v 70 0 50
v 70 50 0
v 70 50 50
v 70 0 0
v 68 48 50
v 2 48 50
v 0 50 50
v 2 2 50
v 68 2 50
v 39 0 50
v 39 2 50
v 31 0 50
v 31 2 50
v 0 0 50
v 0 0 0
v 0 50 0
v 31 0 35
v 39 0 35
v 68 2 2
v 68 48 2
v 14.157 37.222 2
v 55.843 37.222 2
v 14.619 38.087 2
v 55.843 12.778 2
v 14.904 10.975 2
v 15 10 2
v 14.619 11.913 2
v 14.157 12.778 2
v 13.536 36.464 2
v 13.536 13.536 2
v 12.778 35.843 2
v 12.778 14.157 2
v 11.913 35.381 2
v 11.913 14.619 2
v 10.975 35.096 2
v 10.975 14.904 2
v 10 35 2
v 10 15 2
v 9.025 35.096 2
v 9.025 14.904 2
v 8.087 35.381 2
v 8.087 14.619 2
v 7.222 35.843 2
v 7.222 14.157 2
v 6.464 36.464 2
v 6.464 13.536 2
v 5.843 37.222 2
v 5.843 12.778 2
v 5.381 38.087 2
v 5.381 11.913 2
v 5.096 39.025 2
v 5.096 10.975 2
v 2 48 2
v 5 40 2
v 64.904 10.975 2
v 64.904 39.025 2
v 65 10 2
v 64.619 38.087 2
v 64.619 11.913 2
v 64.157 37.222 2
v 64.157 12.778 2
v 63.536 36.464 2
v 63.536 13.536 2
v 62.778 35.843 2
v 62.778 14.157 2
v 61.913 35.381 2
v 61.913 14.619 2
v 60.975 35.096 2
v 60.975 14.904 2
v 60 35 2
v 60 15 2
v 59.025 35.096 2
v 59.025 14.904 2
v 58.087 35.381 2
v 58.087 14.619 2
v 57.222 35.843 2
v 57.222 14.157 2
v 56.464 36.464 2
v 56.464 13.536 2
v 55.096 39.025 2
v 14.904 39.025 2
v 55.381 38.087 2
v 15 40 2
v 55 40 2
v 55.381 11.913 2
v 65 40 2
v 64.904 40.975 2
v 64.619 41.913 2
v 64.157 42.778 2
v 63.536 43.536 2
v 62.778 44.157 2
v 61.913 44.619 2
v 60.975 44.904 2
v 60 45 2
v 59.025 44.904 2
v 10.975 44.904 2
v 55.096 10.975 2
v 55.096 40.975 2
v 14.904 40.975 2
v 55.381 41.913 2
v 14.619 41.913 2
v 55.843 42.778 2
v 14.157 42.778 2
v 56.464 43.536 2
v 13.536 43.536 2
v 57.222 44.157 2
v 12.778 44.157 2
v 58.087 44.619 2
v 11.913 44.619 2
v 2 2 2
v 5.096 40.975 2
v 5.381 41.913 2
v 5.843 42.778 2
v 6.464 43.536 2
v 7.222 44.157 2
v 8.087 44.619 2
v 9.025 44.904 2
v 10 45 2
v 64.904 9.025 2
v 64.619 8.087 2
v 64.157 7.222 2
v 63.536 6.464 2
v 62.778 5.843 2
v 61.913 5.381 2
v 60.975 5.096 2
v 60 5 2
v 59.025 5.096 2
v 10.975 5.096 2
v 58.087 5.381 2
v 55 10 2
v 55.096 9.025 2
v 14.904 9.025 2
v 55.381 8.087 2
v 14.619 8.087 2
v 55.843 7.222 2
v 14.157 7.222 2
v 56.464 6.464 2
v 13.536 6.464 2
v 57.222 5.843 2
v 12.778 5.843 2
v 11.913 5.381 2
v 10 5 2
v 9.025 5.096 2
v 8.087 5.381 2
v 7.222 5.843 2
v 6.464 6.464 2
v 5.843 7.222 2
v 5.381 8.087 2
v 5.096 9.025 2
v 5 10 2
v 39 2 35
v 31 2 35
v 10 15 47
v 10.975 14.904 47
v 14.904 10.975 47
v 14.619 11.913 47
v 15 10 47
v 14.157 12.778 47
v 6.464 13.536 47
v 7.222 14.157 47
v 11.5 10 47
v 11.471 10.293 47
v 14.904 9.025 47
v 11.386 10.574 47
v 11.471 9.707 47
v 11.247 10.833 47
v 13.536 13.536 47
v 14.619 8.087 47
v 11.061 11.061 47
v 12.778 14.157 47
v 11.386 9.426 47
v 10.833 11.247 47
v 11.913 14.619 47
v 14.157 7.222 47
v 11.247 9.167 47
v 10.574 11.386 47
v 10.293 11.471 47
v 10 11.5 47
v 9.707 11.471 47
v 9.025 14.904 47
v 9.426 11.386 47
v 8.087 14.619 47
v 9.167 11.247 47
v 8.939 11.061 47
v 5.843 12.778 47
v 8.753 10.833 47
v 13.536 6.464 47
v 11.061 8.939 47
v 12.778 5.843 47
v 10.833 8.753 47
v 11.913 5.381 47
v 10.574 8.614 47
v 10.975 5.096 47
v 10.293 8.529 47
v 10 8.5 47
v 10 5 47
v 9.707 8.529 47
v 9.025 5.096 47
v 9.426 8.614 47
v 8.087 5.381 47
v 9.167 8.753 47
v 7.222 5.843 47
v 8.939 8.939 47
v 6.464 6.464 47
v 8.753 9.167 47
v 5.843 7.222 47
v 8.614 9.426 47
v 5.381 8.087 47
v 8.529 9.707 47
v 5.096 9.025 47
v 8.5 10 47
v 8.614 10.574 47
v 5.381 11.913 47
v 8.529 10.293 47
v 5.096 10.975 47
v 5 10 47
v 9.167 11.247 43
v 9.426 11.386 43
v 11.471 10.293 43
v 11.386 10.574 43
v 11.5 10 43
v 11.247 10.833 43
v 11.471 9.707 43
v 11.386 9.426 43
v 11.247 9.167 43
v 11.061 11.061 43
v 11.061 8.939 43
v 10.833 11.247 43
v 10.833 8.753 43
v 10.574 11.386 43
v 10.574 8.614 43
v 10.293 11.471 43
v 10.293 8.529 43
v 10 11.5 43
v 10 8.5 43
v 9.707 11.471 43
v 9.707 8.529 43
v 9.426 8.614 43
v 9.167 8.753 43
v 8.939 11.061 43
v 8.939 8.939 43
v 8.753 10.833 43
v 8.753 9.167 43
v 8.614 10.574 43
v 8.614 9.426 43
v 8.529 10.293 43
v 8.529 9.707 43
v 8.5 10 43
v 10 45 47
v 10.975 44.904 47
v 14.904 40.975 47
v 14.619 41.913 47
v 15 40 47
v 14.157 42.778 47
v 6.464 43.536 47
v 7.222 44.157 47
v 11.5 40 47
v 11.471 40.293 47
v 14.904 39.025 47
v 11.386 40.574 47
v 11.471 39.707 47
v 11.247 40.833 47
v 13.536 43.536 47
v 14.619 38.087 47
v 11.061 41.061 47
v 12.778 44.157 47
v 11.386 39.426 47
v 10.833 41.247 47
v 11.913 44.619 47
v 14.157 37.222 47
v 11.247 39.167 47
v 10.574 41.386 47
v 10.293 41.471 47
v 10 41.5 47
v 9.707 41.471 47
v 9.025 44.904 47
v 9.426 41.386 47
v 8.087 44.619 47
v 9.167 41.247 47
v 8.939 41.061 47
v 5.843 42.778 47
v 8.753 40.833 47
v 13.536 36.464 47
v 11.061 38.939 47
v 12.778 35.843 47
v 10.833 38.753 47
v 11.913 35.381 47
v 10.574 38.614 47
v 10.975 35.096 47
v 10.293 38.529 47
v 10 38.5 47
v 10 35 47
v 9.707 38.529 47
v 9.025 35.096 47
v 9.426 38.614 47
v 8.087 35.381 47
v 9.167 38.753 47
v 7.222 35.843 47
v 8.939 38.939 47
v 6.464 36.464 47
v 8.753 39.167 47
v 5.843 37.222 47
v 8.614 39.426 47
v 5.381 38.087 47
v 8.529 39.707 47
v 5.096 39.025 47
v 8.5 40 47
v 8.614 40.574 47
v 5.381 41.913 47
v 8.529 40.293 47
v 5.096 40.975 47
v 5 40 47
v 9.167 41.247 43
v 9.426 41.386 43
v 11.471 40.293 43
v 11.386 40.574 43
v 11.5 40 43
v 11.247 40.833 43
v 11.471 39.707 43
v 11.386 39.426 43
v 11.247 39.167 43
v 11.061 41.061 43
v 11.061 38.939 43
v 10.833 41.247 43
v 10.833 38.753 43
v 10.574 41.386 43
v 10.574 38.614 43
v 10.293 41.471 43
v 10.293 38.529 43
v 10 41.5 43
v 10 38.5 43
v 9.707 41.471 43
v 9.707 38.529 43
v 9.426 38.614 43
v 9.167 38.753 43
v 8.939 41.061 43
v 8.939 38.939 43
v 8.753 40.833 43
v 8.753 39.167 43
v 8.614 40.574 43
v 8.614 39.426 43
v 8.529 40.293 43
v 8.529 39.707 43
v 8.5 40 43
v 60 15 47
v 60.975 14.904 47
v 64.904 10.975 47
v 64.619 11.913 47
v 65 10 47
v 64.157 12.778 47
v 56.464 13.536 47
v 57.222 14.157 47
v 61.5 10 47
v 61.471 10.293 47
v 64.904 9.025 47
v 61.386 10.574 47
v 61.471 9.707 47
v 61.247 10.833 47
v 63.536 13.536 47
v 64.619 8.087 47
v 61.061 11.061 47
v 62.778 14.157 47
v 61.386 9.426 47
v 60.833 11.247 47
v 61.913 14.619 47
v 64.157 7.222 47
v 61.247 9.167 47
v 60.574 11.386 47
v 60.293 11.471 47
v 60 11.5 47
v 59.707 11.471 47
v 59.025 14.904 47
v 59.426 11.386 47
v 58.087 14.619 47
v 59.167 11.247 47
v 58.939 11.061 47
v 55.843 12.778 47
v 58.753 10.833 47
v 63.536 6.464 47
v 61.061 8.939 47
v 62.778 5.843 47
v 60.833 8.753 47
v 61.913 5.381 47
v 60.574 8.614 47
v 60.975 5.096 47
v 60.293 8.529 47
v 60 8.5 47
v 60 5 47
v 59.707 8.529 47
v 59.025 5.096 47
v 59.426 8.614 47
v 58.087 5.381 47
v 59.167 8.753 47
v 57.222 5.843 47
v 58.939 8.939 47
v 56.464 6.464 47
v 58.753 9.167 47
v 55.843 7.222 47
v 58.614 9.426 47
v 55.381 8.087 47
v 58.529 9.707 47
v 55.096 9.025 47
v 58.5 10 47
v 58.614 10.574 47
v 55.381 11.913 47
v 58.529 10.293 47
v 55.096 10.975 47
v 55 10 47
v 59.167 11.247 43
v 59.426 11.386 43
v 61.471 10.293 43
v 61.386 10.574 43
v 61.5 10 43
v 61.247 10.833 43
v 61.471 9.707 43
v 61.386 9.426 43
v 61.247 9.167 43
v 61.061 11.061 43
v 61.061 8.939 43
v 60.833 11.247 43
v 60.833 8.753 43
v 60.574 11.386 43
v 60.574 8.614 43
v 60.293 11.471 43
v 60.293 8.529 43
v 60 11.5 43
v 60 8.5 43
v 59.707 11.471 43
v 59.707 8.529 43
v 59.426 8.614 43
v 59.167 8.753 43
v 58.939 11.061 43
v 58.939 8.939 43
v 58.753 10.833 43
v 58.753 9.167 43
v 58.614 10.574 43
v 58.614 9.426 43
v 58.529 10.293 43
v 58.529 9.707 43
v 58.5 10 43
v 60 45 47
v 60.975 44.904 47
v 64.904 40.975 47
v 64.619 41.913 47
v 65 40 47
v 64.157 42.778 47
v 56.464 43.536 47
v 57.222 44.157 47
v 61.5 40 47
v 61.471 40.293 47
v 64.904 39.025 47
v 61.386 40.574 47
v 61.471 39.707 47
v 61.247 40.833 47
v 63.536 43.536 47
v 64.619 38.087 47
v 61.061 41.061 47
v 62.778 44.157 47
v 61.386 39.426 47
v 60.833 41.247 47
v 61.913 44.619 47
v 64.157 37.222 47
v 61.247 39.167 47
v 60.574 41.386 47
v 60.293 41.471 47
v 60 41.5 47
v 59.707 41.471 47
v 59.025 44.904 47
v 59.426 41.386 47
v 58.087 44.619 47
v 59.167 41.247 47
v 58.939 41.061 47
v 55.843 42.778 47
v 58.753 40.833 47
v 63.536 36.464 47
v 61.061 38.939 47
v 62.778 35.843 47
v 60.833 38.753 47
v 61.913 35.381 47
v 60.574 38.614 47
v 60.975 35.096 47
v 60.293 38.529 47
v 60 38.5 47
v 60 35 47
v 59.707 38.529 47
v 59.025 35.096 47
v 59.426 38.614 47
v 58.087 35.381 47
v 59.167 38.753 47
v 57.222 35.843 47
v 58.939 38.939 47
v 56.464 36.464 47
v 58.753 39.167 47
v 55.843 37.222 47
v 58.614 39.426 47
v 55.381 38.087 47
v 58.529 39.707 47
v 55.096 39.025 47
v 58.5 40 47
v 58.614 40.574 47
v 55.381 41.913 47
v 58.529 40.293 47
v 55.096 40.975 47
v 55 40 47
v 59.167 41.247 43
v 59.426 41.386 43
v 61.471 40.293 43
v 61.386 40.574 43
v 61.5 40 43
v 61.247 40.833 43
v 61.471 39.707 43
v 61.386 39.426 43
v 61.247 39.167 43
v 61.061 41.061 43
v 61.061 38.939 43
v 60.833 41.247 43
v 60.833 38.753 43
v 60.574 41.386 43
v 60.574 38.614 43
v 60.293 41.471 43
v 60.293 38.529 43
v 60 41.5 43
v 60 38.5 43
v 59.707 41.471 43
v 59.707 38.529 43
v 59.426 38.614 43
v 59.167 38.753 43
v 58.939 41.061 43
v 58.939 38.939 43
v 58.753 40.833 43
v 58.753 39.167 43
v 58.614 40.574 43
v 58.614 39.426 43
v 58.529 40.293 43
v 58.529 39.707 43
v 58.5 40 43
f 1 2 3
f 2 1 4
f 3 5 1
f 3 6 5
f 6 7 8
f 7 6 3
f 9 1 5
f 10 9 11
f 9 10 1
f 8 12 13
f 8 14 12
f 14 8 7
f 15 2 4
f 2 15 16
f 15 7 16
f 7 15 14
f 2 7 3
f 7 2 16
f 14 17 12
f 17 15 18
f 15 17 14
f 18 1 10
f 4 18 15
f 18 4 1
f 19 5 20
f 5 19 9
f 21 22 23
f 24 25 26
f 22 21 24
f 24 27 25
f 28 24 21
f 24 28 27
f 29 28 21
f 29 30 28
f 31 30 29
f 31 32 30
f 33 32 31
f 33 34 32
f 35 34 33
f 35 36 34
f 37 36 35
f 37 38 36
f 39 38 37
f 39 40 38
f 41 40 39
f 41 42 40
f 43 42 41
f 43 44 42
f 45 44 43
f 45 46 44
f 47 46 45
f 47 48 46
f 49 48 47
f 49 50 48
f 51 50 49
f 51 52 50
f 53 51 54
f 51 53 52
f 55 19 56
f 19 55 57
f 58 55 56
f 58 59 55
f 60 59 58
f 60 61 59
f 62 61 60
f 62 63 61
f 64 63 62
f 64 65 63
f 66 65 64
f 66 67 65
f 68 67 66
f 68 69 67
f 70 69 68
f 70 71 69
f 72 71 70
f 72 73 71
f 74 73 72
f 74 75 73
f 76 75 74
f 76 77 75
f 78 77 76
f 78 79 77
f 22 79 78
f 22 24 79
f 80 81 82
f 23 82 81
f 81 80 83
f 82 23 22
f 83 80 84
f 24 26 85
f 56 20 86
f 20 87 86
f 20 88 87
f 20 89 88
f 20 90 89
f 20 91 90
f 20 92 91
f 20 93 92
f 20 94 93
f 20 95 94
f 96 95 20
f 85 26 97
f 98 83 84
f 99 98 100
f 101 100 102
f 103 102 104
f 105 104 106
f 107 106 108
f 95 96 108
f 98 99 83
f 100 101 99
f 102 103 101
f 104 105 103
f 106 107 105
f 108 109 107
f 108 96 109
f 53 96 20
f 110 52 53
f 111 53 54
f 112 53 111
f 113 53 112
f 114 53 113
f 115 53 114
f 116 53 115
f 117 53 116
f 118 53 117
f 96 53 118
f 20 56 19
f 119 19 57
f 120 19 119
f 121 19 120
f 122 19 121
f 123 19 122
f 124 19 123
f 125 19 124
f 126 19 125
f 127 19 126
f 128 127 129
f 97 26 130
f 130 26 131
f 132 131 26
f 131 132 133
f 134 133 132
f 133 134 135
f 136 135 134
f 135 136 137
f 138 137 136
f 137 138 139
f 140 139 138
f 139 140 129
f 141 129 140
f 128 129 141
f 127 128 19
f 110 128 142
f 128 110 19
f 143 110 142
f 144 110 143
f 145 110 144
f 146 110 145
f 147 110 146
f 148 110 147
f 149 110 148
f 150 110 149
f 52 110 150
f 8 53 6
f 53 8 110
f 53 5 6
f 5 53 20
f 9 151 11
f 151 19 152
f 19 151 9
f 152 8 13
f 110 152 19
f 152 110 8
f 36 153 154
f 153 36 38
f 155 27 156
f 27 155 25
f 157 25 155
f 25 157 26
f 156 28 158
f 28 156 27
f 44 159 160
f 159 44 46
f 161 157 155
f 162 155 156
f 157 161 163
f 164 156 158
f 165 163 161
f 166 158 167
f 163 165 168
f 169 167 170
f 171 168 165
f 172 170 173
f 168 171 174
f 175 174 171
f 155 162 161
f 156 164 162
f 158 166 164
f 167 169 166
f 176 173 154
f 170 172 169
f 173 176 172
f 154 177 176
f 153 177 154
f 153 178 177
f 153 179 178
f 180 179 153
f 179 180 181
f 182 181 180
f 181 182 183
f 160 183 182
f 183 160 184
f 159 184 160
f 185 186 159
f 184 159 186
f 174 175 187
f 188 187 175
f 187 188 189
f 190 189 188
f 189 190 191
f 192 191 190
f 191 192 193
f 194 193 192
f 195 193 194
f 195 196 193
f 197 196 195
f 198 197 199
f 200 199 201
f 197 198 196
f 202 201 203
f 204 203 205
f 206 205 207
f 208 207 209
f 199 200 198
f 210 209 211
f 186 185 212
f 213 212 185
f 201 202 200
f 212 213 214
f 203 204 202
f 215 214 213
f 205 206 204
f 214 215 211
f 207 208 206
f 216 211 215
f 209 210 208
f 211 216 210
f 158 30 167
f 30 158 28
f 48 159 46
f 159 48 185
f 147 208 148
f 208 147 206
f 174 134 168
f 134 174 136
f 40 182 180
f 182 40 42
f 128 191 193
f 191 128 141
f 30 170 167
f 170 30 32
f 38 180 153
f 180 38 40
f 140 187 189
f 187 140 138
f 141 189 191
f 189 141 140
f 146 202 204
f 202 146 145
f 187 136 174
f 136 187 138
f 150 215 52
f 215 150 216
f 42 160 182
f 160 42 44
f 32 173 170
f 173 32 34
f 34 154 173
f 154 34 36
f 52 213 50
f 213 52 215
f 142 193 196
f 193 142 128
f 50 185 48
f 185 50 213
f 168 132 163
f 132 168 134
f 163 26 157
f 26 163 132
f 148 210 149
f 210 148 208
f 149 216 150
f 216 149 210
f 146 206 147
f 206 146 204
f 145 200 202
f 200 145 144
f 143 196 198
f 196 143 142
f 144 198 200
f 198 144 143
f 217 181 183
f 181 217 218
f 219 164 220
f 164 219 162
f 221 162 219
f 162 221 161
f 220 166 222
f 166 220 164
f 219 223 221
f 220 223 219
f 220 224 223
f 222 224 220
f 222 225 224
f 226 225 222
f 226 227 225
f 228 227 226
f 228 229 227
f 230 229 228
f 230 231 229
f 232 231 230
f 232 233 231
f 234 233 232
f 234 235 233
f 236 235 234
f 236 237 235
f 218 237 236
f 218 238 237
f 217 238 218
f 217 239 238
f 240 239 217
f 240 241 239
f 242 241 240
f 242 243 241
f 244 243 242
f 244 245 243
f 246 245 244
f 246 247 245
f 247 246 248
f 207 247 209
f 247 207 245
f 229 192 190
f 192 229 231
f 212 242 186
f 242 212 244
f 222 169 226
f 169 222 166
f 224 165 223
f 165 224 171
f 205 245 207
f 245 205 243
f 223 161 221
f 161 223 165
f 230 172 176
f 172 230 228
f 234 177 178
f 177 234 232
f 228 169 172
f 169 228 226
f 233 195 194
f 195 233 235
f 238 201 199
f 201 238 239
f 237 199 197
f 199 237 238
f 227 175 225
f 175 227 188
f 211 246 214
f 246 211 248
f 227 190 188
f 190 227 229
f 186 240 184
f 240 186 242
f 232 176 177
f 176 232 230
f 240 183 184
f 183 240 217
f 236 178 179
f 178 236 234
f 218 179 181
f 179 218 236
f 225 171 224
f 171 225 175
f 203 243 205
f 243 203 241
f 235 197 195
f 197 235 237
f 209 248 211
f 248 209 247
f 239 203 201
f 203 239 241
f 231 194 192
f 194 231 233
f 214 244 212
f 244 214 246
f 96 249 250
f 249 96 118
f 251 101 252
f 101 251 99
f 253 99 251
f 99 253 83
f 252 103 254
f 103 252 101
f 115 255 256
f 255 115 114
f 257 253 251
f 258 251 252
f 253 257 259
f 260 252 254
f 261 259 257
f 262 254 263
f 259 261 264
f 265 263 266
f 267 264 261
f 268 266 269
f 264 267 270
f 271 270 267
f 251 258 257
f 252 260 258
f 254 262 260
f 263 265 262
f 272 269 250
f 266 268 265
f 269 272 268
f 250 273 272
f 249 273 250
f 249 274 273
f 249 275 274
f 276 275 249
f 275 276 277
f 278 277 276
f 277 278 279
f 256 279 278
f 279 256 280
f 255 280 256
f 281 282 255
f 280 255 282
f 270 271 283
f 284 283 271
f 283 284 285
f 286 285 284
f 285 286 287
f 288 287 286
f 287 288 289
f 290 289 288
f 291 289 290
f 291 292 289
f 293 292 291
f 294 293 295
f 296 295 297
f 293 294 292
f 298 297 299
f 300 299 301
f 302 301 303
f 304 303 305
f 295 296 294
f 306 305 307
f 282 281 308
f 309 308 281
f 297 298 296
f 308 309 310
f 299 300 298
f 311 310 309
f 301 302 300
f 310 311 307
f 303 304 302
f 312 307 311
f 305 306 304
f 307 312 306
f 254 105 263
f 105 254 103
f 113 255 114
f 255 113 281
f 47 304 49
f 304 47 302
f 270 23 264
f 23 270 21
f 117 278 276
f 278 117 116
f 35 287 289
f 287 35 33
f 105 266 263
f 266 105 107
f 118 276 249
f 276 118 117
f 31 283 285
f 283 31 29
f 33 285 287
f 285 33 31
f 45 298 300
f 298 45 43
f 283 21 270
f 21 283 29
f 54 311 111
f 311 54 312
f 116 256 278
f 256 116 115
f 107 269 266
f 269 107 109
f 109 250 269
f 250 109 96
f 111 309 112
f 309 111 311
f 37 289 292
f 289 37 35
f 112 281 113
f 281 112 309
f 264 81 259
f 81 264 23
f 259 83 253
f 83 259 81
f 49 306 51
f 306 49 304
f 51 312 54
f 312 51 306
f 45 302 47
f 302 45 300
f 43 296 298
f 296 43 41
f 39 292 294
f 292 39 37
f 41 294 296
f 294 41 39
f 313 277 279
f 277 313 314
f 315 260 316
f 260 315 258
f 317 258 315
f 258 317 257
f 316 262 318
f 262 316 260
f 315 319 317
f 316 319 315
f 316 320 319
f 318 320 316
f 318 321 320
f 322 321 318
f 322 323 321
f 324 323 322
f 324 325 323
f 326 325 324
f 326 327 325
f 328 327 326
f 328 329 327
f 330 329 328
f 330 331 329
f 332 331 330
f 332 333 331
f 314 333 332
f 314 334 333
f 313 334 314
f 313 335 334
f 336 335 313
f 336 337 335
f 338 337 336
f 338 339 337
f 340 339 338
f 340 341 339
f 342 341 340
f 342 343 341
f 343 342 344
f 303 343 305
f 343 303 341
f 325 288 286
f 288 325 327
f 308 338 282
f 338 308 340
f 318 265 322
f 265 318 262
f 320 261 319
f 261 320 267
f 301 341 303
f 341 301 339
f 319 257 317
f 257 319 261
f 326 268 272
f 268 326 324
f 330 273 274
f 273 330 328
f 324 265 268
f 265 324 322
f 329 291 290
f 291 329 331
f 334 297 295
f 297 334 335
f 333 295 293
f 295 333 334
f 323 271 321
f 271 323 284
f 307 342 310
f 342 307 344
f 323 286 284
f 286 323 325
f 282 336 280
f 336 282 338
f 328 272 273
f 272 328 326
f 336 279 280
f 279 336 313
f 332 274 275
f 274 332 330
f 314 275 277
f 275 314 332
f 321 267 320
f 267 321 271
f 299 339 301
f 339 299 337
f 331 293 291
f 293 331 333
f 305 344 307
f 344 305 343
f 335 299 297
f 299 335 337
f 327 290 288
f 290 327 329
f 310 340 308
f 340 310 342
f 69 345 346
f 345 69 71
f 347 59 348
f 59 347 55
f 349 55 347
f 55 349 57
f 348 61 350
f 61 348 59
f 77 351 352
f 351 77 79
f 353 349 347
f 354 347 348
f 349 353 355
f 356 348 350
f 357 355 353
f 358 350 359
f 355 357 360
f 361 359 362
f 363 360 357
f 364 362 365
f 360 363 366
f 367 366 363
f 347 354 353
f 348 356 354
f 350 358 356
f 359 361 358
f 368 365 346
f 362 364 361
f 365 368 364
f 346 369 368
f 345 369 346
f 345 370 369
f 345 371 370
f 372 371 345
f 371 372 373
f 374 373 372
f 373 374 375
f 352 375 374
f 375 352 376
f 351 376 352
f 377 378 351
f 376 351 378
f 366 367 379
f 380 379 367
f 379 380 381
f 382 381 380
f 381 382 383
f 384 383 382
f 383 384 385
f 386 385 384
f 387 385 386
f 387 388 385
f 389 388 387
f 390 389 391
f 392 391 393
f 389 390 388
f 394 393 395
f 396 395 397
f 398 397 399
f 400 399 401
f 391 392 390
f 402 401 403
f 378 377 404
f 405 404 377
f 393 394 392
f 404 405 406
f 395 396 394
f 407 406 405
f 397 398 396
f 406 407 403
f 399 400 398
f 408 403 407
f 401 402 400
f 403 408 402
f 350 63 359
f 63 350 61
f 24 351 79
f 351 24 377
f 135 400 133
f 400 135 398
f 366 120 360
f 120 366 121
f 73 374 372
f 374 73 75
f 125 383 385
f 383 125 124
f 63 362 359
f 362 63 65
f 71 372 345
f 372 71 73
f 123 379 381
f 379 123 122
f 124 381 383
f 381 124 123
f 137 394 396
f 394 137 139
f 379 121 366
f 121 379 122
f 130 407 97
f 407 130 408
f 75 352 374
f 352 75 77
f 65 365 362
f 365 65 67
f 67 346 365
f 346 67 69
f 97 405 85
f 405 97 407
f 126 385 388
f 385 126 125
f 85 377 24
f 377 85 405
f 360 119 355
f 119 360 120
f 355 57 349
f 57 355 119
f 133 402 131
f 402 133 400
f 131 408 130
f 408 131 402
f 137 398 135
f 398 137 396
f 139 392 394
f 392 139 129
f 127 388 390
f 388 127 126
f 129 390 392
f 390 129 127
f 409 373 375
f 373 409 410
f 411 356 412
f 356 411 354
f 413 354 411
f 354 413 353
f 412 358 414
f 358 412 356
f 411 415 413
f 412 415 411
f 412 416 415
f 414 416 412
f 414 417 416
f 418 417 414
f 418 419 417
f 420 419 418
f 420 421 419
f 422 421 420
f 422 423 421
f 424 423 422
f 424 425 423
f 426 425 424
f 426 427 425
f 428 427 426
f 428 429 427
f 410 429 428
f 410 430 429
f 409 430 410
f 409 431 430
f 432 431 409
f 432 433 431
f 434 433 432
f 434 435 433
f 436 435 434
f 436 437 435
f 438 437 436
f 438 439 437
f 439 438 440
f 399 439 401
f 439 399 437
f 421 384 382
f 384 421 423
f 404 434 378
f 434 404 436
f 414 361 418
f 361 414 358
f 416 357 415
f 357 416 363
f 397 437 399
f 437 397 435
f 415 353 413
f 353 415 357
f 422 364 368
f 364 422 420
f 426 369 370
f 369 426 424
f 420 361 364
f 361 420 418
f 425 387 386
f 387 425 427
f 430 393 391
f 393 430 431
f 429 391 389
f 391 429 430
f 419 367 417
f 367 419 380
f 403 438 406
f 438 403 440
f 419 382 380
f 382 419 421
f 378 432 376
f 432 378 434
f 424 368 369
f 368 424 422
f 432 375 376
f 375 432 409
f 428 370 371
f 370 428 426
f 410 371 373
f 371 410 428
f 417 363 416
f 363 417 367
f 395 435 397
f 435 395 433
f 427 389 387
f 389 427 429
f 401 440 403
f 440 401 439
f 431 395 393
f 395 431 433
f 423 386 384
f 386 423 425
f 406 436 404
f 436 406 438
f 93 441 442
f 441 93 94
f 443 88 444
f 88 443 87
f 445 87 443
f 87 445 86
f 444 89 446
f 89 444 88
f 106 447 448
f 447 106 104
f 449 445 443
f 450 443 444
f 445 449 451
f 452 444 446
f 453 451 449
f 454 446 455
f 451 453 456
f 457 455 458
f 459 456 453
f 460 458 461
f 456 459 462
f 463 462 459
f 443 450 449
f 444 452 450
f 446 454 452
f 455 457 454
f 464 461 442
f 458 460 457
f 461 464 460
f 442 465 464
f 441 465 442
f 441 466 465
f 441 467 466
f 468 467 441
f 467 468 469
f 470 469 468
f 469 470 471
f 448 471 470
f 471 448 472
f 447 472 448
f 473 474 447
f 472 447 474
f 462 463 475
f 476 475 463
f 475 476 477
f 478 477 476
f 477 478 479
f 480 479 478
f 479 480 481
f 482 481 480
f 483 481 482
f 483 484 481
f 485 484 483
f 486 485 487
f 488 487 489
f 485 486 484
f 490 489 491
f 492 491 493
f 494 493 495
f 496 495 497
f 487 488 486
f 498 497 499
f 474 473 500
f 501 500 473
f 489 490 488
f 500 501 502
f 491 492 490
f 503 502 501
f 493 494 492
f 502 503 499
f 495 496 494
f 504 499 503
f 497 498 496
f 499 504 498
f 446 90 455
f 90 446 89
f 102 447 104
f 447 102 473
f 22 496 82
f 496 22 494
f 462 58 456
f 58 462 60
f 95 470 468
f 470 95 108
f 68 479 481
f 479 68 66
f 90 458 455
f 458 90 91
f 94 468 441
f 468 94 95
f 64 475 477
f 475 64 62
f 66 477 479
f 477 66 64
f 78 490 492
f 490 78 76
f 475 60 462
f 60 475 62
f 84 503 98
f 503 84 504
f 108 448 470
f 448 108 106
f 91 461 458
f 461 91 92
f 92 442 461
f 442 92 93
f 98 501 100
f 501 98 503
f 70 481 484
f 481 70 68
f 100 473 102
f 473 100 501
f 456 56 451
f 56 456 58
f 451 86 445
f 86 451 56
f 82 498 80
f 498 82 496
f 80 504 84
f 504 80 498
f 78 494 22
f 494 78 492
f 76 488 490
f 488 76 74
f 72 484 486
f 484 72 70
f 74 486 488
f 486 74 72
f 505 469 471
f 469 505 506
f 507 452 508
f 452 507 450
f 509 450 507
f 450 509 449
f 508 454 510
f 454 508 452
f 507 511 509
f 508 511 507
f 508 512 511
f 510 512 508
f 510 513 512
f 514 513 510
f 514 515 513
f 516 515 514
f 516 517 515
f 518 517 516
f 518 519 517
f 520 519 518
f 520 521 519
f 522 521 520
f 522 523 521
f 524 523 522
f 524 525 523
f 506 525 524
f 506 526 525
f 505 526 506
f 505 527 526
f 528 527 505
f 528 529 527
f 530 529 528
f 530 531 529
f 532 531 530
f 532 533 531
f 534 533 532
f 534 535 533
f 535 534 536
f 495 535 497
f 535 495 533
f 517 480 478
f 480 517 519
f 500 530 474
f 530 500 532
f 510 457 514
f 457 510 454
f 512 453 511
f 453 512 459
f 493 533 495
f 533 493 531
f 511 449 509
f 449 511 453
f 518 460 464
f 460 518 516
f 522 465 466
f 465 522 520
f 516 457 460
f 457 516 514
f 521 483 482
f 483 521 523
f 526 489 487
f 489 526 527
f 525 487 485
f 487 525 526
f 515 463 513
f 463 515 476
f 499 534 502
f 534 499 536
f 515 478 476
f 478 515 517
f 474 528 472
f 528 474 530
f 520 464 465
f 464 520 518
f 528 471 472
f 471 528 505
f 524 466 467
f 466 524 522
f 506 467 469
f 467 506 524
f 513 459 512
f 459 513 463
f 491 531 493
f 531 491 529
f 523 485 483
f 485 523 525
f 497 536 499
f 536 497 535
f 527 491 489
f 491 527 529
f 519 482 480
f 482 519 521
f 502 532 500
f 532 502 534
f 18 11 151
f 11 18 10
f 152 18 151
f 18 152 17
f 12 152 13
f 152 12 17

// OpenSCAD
$fn = 32;

// ----------------------------------------------------------------------
// Enclosure box: both enclosure
// ----------------------------------------------------------------------

// --- parameters (mm) ---
box_l = 70;               // outer length, X
box_w = 50;               // outer width, Y
box_h = 50;               // outer height
wall_t = 2;               // wall thickness
boss_r = 5;               // corner boss radius
hole_r = 1.5;             // boss screw hole radius
boss_in = 10;             // boss inset from the corners
notch_w = 8;              // cable notch width
notch_h = 15;             // cable notch height

inner_h = box_h - wall_t;  // cavity depth
boss_h = inner_h - 2;  // corner boss height

difference() {
  union() {
    difference() {
      cube([box_l, box_w, box_h]);
      translate([wall_t, wall_t, wall_t])
        cube([box_l - 2 * wall_t, box_w - 2 * wall_t, box_h]);
    }
    for (sx = [0, 1], sy = [0, 1])
      translate([sx ? box_l - boss_in : boss_in,
                 sy ? box_w - boss_in : boss_in, wall_t - 1])
        difference() {
          cylinder(r = boss_r, h = boss_h);
          translate([0, 0, boss_h - 4])
            cylinder(r = hole_r, h = 5);
        }
  }
  translate([box_l / 2 - notch_w / 2, -1, box_h - notch_h])
    cube([notch_w, wall_t + 2, notch_h + 1]);
}
